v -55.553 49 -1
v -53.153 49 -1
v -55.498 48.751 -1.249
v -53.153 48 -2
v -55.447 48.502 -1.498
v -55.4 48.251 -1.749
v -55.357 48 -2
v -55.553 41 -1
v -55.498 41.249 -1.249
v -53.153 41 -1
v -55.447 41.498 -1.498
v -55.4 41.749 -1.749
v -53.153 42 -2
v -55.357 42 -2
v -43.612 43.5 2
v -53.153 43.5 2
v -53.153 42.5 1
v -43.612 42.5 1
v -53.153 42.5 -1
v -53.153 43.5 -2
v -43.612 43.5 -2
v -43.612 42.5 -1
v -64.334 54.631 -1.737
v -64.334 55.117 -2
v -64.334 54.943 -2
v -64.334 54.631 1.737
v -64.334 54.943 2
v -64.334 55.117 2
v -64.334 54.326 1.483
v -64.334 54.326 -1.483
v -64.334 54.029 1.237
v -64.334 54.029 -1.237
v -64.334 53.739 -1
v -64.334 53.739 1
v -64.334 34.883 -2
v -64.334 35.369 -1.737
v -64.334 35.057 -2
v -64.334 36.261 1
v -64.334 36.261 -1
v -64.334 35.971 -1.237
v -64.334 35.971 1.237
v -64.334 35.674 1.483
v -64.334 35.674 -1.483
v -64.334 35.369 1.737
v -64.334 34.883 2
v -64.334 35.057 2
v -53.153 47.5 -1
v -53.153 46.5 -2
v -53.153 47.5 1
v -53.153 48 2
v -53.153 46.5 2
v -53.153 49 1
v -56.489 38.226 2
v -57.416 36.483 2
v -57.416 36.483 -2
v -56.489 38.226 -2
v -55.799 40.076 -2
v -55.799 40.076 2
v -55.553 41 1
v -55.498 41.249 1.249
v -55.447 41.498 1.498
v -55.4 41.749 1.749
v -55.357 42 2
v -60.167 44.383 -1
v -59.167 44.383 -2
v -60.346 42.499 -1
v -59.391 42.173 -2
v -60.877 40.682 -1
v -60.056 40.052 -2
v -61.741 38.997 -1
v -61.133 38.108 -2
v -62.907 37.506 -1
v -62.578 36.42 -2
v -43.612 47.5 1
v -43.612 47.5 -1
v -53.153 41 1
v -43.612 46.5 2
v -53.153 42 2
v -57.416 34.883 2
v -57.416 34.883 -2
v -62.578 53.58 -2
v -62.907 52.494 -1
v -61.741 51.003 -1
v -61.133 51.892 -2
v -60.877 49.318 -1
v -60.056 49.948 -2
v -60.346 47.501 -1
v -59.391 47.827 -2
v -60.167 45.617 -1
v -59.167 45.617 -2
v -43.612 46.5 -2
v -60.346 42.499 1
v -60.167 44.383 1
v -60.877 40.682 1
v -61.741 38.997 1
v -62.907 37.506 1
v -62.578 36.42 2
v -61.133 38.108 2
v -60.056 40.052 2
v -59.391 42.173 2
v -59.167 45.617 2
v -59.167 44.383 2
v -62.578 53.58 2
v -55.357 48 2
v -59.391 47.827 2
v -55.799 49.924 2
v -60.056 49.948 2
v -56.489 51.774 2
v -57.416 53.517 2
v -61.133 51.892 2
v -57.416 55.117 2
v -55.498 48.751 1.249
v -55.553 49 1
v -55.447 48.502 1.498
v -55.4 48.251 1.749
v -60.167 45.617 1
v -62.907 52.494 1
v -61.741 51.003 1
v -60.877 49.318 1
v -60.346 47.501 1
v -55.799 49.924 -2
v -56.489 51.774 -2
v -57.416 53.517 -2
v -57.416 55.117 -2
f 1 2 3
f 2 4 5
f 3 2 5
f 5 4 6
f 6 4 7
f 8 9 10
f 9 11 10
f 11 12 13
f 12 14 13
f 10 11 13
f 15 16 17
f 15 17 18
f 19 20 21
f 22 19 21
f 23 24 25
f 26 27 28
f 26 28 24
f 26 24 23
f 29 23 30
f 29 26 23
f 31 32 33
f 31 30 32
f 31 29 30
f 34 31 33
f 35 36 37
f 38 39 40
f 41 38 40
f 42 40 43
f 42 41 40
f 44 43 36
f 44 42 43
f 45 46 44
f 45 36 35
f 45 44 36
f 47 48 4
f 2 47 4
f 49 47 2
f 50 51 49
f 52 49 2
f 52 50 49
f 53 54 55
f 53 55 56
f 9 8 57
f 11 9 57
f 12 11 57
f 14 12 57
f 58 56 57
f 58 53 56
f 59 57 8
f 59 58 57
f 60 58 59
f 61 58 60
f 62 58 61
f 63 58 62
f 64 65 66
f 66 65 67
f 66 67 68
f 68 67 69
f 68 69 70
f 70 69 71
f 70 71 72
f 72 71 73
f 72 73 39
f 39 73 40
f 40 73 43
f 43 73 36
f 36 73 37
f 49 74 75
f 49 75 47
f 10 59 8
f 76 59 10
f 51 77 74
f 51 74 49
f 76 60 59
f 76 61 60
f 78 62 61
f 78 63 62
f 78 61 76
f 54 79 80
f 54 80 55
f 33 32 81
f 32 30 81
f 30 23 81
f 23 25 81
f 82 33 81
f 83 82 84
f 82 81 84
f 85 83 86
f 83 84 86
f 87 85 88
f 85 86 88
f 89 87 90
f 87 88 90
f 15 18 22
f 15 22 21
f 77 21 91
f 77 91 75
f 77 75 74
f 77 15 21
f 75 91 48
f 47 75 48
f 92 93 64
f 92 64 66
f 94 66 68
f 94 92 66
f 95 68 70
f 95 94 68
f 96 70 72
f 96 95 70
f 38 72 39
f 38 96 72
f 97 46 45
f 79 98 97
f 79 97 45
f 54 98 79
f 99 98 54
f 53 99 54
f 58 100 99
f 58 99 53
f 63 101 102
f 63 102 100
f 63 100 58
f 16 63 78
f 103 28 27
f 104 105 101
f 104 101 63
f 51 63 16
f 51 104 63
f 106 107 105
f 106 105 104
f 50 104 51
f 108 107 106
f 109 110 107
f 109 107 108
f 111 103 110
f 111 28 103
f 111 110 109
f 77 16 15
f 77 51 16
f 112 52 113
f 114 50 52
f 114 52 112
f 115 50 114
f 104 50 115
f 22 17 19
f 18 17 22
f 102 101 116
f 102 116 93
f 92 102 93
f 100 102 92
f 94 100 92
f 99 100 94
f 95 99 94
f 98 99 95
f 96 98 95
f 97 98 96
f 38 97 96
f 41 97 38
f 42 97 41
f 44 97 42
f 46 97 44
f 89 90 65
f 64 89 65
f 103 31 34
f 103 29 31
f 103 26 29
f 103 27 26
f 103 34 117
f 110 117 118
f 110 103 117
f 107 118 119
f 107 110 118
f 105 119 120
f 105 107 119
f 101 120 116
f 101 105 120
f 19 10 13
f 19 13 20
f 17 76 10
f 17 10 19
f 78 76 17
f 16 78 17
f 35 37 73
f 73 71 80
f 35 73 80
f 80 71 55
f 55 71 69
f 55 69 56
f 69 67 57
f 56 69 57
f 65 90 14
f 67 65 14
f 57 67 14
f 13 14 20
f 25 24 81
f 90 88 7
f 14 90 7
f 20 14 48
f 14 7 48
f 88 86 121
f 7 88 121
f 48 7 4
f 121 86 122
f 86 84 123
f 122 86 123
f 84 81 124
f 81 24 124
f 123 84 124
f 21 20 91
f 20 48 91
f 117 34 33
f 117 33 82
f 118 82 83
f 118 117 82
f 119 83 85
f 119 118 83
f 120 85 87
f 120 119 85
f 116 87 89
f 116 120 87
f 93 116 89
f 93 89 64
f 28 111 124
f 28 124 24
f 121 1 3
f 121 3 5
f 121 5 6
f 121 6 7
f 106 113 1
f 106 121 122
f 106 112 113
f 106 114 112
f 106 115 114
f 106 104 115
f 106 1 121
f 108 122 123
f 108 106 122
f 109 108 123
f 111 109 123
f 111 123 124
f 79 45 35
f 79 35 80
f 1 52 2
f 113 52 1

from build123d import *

# Parameters (mm, degrees)
F1_DEPTH = 2
F2_SIZE  = 1


with BuildPart() as f1:
    # F0 (on Top) → F1 (new body, symmetric)
    with BuildSketch(Plane.XY):
        with BuildLine():
            Line((-64.3336782856, 36.2610286334), (-64.3336782856, 34.8834841531))
            Line((-64.3336782856, 34.8834841531), (-57.4157565349, 34.8834841531))
            Line((-57.4157565349, 34.8834841531), (-57.4157565349, 36.4834841531))
            ThreePointArc((-57.4157565349, 36.4834841531), (-56.2994751301, 38.665413461), (-55.5534152324, 41))
            Line((-55.5534152324, 41), (-53.1534152324, 41))
            Line((-53.1534152324, 41), (-53.1534152324, 42.5))
            Line((-53.1534152324, 42.5), (-43.6123318144, 42.5))
            Line((-43.6123318144, 42.5), (-43.6123318144, 45))
            Line((-43.6123318144, 45), (-43.6123318144, 47.5))
            Line((-43.6123318144, 47.5), (-53.1534152324, 47.5))
            Line((-53.1534152324, 47.5), (-53.1534152324, 49))
            Line((-53.1534152324, 49), (-55.5534152324, 49))
            ThreePointArc((-55.5534152324, 49), (-56.2994751301, 51.334586539), (-57.4157565349, 53.5165158469))
            Line((-57.4157565349, 53.5165158469), (-57.4157565349, 55.1165158469))
            Line((-57.4157565349, 55.1165158469), (-64.3336782856, 55.1165158469))
            Line((-64.3336782856, 55.1165158469), (-64.3336782856, 53.7389713666))
            ThreePointArc((-64.3336782856, 53.7389713666), (-61.2693193587, 50.1809672734), (-60.1668349206, 45.6165158469))
            Line((-60.1668349206, 45.6165158469), (-60.1668349206, 44.3834841531))
            ThreePointArc((-60.1668349206, 44.3834841531), (-61.2693193587, 39.8190327266), (-64.3336782856, 36.2610286334))
        make_face()
    extrude(amount=F1_DEPTH, both=True)

    # F2
    f2_edges = [f1.edges().sort_by_distance(p)[0] for p in [
        (-54.353415, 49, -2),
        (-54.353415, 49, 2),
        (-54.353415, 41, 2),
        (-54.353415, 41, -2),
        (-48.382874, 47.5, -2),
        (-48.382874, 42.5, -2),
        (-48.382874, 47.5, 2),
        (-48.382874, 42.5, 2),
        (-61.269319, 50.180967, 2),
        (-61.269319, 39.819033, -2),
        (-61.269319, 39.819033, 2),
        (-60.166835, 45, -2),
        (-60.166835, 45, 2),
        (-61.269319, 50.180967, -2),
    ]]
    chamfer(f2_edges, length=F2_SIZE)


solid = f1.part
